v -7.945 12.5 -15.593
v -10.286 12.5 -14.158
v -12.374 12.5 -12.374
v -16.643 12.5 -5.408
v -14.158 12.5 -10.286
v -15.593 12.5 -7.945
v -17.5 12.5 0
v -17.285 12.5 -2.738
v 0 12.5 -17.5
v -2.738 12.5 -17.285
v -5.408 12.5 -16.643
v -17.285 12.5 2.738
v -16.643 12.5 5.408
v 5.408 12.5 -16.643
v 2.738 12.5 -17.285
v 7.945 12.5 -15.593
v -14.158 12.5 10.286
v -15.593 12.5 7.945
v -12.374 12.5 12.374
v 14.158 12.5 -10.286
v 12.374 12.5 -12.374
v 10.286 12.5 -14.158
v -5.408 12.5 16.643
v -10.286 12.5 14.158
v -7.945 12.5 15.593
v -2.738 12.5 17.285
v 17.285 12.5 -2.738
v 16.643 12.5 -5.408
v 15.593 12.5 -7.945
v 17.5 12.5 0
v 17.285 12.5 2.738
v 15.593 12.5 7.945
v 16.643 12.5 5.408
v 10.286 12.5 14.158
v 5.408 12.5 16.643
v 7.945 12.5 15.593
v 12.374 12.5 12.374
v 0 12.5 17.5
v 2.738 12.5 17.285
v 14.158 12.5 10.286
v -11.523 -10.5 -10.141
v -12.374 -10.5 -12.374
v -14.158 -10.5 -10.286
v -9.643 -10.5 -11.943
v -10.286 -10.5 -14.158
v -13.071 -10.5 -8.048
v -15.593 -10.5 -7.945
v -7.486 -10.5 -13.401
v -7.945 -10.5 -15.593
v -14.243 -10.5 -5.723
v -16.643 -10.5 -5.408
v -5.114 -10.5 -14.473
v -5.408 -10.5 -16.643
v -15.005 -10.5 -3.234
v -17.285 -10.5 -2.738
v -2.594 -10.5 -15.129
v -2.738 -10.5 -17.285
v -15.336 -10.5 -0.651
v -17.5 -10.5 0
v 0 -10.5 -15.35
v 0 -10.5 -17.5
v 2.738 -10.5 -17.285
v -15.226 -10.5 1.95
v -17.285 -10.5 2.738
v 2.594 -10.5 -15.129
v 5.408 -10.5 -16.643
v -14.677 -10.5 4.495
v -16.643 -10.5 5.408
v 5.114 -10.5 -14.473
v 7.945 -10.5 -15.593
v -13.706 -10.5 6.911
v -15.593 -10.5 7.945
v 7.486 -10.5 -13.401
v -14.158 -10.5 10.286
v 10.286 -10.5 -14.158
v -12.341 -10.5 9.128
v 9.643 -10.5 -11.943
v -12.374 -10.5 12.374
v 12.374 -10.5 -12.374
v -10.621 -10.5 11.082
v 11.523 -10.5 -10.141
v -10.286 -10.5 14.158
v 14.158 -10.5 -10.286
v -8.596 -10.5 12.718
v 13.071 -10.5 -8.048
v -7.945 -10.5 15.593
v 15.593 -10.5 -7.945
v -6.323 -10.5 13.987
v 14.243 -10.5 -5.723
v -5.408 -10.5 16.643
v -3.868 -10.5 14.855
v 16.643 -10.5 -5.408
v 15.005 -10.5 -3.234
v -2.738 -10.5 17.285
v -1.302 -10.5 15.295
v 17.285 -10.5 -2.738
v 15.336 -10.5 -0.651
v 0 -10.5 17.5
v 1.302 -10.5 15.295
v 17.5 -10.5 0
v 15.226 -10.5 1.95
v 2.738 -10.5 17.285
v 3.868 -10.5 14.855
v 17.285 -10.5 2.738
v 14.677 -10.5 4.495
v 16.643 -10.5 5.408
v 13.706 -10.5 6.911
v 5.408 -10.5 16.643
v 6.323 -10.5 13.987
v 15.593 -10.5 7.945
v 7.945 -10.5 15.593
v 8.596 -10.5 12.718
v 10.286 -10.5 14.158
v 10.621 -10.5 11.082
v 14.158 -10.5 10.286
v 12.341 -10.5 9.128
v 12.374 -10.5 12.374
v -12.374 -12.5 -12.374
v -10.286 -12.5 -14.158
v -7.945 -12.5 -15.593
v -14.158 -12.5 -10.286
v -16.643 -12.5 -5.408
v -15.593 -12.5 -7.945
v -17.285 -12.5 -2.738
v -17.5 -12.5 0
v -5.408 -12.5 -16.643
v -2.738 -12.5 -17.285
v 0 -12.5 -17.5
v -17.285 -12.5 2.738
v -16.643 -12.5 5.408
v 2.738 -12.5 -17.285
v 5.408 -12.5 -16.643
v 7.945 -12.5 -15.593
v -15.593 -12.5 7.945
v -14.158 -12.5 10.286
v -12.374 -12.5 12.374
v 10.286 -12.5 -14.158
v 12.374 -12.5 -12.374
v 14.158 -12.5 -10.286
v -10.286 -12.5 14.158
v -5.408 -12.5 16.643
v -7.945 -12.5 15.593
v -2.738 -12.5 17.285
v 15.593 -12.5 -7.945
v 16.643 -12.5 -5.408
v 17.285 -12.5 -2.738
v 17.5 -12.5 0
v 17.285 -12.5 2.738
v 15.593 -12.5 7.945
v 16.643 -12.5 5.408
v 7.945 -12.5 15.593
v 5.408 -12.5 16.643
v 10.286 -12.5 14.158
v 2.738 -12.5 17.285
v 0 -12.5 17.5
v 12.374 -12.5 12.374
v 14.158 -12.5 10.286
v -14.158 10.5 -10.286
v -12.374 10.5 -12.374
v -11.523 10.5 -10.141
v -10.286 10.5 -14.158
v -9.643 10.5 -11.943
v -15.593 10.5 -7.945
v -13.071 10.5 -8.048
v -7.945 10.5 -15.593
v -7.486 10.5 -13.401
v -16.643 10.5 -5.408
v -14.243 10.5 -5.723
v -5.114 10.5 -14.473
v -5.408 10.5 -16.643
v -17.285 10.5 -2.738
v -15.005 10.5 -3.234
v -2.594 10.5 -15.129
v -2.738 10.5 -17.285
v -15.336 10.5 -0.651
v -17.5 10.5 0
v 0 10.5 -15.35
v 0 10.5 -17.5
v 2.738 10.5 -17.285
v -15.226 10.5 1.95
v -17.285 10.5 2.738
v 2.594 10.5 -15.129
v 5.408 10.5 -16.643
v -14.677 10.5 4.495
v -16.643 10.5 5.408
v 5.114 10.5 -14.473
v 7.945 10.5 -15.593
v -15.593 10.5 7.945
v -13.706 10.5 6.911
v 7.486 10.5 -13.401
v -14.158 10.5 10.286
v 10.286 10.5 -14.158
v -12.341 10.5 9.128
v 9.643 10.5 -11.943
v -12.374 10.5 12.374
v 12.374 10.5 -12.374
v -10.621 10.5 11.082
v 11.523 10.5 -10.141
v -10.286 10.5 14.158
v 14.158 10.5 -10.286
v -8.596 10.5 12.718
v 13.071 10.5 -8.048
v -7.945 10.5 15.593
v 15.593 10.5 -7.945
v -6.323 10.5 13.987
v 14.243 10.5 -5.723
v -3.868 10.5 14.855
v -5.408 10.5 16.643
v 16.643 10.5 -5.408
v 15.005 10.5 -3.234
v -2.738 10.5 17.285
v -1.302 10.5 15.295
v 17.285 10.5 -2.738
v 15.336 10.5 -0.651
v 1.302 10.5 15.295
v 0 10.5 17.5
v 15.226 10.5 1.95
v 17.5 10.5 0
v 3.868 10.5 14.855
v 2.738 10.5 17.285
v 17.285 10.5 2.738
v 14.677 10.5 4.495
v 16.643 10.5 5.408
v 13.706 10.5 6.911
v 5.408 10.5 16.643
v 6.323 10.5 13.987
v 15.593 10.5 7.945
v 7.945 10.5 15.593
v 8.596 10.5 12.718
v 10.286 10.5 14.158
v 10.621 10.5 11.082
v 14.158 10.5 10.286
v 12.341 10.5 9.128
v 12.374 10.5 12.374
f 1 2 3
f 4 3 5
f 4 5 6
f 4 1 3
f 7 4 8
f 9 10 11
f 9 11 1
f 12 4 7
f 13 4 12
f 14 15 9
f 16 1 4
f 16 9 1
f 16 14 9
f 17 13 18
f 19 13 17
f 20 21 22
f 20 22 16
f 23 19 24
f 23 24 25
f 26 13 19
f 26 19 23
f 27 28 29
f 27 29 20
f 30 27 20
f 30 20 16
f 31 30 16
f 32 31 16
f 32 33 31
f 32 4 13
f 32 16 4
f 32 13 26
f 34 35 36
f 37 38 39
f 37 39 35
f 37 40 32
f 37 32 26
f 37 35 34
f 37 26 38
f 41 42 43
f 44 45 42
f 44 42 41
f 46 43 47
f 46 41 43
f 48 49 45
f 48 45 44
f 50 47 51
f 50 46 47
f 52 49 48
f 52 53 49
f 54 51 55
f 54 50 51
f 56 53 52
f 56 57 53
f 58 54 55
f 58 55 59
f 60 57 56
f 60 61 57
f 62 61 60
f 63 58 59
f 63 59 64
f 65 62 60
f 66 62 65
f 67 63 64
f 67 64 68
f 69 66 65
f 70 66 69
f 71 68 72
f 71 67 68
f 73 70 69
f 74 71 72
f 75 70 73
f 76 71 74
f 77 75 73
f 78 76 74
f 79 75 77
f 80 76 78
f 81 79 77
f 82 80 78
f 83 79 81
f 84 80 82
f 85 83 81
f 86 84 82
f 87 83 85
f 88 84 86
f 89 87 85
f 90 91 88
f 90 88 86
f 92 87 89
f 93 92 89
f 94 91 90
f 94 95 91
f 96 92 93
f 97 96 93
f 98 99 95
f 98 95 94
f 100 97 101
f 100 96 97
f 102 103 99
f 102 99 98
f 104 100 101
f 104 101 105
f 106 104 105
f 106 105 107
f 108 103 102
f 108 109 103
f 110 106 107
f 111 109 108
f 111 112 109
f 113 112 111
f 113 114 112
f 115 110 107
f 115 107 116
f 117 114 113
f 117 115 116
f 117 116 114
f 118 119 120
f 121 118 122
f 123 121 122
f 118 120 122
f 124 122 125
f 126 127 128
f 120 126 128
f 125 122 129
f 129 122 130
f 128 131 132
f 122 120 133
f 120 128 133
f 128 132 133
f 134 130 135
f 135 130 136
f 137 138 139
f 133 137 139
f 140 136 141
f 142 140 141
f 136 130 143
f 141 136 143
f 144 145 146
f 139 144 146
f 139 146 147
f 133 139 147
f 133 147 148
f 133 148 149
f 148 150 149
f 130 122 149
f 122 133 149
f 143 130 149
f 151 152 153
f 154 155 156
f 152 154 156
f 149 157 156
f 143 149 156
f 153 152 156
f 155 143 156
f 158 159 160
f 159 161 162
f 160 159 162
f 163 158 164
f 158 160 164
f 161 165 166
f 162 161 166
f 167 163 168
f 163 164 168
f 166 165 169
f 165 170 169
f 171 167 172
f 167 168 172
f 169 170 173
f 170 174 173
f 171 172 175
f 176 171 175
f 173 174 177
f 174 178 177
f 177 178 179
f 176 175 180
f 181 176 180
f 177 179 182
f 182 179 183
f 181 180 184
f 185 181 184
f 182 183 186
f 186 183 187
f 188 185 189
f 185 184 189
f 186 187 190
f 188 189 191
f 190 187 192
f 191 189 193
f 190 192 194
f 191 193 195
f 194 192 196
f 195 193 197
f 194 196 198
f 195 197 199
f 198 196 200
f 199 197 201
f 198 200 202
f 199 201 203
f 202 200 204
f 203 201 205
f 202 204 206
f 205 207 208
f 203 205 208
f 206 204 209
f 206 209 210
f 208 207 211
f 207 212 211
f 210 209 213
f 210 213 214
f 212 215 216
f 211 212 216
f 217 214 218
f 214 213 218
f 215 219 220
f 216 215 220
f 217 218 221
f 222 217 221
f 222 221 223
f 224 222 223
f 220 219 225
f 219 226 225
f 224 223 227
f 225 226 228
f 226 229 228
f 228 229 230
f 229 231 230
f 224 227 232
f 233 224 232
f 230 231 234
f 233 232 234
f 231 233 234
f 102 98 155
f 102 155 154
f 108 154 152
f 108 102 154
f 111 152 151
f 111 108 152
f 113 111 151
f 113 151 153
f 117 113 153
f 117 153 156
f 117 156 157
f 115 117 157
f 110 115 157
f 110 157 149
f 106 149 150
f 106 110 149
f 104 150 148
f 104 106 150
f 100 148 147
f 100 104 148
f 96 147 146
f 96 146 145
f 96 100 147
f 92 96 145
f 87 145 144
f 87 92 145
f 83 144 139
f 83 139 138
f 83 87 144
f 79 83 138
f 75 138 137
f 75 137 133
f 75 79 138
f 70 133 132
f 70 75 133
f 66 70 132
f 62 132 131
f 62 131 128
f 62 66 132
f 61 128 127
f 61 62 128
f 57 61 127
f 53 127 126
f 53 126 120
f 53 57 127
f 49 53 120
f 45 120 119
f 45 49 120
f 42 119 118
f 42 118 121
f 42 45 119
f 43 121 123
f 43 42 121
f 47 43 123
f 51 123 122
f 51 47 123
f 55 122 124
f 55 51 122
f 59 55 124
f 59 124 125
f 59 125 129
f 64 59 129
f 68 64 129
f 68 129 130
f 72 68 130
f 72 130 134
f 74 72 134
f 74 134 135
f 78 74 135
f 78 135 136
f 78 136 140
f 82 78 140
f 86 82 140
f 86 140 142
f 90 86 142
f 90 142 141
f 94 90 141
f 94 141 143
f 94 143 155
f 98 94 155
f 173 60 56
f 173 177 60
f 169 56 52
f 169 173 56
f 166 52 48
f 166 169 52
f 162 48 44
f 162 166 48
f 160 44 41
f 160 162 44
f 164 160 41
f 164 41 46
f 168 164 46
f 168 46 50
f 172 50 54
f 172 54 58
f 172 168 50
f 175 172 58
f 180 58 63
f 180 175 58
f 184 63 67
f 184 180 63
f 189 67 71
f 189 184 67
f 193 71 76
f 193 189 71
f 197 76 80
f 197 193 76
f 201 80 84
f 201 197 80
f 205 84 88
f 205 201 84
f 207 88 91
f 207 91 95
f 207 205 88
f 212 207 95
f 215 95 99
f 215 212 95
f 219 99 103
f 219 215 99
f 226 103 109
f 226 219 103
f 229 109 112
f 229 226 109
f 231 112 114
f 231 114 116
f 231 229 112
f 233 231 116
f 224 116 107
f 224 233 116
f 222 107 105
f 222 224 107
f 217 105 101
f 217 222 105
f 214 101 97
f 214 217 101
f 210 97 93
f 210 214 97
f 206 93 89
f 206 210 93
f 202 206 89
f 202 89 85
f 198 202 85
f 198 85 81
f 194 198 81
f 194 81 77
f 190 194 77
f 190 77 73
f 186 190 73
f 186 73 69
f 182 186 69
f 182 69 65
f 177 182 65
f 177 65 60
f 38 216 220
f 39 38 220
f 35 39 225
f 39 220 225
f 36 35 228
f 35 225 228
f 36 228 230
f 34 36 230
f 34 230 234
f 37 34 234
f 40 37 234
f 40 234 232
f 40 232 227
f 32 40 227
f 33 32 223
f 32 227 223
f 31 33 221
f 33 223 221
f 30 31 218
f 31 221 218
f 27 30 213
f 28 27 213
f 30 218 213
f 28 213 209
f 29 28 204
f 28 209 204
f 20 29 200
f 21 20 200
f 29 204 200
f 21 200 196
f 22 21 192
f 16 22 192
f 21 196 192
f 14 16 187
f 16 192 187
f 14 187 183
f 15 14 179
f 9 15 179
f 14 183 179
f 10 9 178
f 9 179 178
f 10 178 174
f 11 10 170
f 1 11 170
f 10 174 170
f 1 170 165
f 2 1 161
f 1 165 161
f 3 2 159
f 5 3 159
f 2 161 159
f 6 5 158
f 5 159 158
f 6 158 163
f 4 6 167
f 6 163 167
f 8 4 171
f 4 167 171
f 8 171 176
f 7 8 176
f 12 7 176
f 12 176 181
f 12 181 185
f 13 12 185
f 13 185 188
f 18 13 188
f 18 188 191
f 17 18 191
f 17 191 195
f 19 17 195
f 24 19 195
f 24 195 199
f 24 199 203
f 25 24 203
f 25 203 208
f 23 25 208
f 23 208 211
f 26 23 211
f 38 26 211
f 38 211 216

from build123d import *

# Parameters (mm, degrees)
SKETCH_1_R      = 15.35
EXTRUDE_1_DEPTH = 10.5
SKETCH_2_R      = 17.5
EXTRUDE_2_DEPTH = 2


with BuildPart() as part:
    # 草图1 → 凸台-拉伸1 (new, symmetric)
    with BuildSketch(Plane(origin=(0, 0, 0), x_dir=(1, 0, 0), z_dir=(0, 1, 0))):
        with Locations(Location((0, 0, 0), (0, 0, 90))):
            Circle(SKETCH_1_R)
    extrude(amount=EXTRUDE_1_DEPTH, both=True)

    # 草图2 → 凸台-拉伸2 (add)
    with BuildSketch(Plane(origin=(0, 10.5, 0), x_dir=(1, 0, 0), z_dir=(0, 1, 0))):
        with Locations(Location((0, 0, 0), (0, 0, 270))):
            Circle(SKETCH_2_R)
    extrude_2 = extrude(amount=EXTRUDE_2_DEPTH)

    # 镜向1: 凸台-拉伸2 across plane
    add(extrude_2.mirror(Plane.ZX))


solid = part.part
